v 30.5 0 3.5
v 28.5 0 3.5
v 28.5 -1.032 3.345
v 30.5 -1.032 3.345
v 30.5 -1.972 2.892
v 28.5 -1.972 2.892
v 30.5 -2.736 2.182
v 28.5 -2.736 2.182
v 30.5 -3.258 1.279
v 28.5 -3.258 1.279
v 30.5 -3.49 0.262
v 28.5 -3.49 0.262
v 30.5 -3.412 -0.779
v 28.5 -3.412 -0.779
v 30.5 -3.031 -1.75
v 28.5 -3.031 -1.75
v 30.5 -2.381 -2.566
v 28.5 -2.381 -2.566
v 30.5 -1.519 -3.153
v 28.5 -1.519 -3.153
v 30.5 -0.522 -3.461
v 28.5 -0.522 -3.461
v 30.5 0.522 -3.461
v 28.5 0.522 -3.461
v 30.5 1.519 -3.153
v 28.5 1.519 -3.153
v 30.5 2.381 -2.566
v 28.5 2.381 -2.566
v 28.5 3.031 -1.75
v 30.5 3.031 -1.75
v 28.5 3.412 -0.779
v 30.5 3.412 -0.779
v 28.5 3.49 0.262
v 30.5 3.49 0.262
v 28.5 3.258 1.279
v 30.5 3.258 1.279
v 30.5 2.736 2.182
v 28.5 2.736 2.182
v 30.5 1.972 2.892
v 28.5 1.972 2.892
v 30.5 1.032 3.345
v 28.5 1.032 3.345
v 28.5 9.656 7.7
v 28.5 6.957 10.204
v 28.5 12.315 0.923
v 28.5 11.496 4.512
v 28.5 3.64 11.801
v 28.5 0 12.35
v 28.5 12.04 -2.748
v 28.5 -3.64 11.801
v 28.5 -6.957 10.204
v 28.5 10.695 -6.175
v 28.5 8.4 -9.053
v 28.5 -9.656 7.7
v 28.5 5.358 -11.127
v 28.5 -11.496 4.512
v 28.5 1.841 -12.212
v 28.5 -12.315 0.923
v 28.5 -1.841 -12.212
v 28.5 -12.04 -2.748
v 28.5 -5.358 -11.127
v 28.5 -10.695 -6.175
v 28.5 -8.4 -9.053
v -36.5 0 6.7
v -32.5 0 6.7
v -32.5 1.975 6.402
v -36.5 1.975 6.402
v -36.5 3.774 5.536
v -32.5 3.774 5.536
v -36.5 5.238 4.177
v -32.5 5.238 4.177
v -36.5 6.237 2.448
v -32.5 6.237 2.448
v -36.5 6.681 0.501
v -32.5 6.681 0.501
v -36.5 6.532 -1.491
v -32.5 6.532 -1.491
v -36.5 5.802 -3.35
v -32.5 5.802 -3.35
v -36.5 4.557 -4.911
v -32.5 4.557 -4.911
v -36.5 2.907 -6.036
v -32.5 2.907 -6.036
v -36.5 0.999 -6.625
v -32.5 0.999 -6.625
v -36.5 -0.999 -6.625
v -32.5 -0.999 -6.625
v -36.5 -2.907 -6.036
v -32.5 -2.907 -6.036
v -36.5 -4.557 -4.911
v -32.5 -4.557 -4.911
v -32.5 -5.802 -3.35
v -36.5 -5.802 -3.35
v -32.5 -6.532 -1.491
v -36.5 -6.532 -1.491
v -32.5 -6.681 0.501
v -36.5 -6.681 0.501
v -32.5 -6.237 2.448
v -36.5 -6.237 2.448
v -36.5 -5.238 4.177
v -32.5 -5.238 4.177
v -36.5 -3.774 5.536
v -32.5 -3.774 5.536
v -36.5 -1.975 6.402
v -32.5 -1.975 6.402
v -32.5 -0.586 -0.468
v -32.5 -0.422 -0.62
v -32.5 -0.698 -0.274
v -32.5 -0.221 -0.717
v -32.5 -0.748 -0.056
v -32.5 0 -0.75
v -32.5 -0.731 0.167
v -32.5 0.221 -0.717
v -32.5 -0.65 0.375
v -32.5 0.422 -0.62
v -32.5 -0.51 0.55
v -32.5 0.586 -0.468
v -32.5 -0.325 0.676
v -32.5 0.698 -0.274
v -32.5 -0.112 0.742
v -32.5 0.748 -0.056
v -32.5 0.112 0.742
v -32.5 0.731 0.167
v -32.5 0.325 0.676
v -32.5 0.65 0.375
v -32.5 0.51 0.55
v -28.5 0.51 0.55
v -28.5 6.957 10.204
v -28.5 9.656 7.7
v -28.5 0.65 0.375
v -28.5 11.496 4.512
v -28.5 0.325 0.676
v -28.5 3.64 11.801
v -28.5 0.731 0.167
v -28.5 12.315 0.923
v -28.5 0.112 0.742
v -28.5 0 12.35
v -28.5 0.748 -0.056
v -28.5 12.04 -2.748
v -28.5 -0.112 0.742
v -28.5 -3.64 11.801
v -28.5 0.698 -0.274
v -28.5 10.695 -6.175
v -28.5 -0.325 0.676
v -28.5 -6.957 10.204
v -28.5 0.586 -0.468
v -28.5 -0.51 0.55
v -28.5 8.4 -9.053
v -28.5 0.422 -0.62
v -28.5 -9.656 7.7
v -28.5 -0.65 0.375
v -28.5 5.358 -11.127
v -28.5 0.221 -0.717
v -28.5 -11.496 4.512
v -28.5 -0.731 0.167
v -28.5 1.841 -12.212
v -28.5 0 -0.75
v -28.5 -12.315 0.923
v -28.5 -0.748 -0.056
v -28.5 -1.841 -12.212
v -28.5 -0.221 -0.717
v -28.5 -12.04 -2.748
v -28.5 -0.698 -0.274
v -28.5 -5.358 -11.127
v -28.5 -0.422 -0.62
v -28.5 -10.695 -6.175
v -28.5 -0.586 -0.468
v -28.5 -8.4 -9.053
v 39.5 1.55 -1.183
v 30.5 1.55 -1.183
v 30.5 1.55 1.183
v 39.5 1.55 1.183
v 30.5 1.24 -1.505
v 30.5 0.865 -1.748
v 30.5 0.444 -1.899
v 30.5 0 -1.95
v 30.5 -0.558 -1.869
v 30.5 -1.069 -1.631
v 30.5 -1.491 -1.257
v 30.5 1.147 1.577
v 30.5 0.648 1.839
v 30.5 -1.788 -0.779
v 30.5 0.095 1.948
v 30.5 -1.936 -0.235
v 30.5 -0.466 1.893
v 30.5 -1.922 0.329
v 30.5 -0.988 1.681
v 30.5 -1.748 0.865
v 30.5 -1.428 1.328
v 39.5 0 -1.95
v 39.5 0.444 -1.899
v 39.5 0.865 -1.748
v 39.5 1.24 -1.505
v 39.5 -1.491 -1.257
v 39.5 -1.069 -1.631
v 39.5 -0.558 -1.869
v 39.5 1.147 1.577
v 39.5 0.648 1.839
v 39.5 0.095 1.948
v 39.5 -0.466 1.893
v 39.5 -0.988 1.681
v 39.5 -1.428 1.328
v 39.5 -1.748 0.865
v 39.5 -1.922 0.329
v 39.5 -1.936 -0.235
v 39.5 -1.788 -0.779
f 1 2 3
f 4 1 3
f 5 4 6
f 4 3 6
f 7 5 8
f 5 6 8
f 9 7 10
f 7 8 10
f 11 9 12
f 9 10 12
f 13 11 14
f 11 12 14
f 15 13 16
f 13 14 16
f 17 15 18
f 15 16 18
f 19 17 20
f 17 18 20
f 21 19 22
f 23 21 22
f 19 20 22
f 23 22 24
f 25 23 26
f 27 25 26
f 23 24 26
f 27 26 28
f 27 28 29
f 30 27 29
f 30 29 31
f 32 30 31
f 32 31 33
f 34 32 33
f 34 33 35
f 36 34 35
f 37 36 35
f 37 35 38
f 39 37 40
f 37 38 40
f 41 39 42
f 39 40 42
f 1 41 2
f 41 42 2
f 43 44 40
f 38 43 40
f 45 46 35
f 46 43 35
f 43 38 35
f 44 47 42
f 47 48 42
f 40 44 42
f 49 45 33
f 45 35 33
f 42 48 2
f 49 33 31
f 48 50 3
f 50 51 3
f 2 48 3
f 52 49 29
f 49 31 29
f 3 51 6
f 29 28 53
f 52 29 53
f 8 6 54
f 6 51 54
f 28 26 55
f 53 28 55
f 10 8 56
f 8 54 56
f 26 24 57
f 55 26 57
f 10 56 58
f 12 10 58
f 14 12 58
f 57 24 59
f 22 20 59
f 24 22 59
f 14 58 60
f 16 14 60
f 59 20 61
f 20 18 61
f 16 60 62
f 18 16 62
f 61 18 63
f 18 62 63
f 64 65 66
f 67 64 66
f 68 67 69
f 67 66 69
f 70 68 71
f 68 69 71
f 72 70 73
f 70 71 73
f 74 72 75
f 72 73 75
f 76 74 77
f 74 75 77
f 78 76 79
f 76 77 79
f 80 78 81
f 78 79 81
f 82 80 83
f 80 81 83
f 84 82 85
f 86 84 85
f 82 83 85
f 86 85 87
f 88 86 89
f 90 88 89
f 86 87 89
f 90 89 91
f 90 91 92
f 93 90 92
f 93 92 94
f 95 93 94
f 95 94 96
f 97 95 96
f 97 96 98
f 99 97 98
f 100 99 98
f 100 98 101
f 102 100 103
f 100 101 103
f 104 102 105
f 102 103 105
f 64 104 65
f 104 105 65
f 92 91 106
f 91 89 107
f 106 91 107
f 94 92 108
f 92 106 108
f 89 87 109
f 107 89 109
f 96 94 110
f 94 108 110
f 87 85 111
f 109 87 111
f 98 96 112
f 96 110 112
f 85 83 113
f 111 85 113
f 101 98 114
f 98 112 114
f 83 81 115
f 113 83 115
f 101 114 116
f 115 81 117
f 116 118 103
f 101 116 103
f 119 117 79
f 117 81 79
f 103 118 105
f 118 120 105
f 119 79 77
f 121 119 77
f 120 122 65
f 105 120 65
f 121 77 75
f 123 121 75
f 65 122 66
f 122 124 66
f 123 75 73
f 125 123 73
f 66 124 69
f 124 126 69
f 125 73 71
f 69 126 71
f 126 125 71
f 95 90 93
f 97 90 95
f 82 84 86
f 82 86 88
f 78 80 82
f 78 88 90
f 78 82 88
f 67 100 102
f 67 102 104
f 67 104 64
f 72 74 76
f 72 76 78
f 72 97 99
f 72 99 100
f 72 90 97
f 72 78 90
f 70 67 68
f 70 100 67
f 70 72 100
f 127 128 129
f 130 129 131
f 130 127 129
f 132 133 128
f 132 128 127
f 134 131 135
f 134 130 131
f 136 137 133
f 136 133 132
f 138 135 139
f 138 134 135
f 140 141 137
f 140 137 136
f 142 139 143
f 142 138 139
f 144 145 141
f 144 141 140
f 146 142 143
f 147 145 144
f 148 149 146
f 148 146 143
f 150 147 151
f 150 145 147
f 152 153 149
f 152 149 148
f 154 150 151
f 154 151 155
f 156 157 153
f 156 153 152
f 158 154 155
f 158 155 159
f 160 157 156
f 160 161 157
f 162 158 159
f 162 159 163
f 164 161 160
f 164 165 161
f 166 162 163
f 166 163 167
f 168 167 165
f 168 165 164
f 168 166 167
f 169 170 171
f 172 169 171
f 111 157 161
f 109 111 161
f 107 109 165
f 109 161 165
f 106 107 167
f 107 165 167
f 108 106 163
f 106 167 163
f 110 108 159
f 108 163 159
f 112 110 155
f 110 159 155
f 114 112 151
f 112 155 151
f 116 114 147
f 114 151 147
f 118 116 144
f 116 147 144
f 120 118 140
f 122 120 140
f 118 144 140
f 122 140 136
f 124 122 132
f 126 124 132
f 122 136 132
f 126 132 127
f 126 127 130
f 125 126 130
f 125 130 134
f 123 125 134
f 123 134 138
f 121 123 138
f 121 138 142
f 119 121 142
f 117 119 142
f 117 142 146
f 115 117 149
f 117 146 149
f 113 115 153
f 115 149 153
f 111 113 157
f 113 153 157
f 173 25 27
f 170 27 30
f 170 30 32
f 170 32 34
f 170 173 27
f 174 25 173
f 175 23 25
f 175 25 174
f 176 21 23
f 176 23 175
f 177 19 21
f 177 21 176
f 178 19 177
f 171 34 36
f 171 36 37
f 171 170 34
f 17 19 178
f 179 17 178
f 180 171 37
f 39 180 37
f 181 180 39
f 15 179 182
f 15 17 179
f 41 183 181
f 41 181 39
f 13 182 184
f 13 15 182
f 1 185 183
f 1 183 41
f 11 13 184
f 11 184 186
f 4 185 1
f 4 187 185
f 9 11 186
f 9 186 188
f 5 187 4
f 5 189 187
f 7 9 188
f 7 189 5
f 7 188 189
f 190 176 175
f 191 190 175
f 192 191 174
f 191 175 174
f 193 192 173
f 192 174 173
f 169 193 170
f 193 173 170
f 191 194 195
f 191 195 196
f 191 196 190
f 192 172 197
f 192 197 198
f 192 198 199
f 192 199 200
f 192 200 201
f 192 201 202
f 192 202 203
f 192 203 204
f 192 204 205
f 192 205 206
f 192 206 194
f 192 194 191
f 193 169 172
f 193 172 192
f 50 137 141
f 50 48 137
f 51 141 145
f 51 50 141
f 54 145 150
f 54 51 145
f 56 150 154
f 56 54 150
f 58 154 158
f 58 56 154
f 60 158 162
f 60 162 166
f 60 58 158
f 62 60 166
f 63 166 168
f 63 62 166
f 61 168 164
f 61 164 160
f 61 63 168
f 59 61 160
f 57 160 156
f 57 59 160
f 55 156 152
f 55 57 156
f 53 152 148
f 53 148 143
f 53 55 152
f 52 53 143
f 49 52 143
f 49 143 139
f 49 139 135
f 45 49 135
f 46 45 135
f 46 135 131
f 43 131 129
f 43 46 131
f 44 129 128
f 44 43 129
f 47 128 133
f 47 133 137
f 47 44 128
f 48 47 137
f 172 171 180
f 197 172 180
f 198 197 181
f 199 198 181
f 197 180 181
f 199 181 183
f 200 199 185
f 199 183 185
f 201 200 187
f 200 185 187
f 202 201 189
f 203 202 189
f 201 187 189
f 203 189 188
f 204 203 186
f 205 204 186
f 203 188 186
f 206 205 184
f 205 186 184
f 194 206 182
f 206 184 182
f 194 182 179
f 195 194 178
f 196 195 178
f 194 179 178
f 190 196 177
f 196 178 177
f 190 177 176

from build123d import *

# Parameters (mm, degrees)
SKETCH_1_W      = 57
SKETCH_1_H      = 12.35
SKETCH_2_R      = 3.5
EXTRUDE_1_DEPTH = 2
SKETCH_5_R      = 0.75
EXTRUDE_3_DEPTH = 4
SKETCH_6_R      = 6.7
EXTRUDE_4_DEPTH = 4
EXTRUDE_5_DEPTH = 9


with BuildPart() as part:
    # Эскиз1 → Повернуть1 (revolve)
    with BuildSketch(Plane(origin=(0, 0, 0), x_dir=(1, 0, 0), z_dir=(0, 1, 0)), mode=Mode.PRIVATE) as revolve_1_sk:
        with Locations((0, 6.175)):
            Rectangle(SKETCH_1_W, SKETCH_1_H)
    revolve(revolve_1_sk.sketch.rotate(Axis((-28.5, 0, 0), (1, 0, 0)), 180), axis=Axis((-28.5, 0, 0), (1, 0, 0)))

    # Эскиз2 → Бобышка-Вытянуть1 (add)
    with BuildSketch(Plane(origin=(28.5, 0, 0), x_dir=(0, 0, -1), z_dir=(1, 0, 0))):
        with Locations(Location((0, 0, 0), (0, 0, 180))):
            Circle(SKETCH_2_R)
    extrude(amount=EXTRUDE_1_DEPTH)

    # Эскиз5 → Бобышка-Вытянуть3 (add)
    with BuildSketch(Plane.ZY.offset(28.5)):
        with Locations(Location((0, 0, 0), (0, 0, 180))):
            Circle(SKETCH_5_R)
    extrude(amount=EXTRUDE_3_DEPTH)

    # Эскиз6 → Бобышка-Вытянуть4 (add)
    with BuildSketch(Plane.ZY.offset(32.5)):
        Circle(SKETCH_6_R)
    extrude(amount=EXTRUDE_4_DEPTH)

    # Эскиз3 → Бобышка-Вытянуть5 (add)
    with BuildSketch(Plane(origin=(30.5, 0, 0), x_dir=(0, 0, -1), z_dir=(1, 0, 0))):
        with BuildLine():
            Line((1.183215957, 1.55), (-1.183215957, 1.55))
            ThreePointArc((-1.183215957, 1.55), (-0.864647004, -1.747823091), (1.95, 0))
            ThreePointArc((1.95, 0), (1.747823091, 0.864647004), (1.183215957, 1.55))
        make_face()
    extrude(amount=EXTRUDE_5_DEPTH)


solid = part.part
